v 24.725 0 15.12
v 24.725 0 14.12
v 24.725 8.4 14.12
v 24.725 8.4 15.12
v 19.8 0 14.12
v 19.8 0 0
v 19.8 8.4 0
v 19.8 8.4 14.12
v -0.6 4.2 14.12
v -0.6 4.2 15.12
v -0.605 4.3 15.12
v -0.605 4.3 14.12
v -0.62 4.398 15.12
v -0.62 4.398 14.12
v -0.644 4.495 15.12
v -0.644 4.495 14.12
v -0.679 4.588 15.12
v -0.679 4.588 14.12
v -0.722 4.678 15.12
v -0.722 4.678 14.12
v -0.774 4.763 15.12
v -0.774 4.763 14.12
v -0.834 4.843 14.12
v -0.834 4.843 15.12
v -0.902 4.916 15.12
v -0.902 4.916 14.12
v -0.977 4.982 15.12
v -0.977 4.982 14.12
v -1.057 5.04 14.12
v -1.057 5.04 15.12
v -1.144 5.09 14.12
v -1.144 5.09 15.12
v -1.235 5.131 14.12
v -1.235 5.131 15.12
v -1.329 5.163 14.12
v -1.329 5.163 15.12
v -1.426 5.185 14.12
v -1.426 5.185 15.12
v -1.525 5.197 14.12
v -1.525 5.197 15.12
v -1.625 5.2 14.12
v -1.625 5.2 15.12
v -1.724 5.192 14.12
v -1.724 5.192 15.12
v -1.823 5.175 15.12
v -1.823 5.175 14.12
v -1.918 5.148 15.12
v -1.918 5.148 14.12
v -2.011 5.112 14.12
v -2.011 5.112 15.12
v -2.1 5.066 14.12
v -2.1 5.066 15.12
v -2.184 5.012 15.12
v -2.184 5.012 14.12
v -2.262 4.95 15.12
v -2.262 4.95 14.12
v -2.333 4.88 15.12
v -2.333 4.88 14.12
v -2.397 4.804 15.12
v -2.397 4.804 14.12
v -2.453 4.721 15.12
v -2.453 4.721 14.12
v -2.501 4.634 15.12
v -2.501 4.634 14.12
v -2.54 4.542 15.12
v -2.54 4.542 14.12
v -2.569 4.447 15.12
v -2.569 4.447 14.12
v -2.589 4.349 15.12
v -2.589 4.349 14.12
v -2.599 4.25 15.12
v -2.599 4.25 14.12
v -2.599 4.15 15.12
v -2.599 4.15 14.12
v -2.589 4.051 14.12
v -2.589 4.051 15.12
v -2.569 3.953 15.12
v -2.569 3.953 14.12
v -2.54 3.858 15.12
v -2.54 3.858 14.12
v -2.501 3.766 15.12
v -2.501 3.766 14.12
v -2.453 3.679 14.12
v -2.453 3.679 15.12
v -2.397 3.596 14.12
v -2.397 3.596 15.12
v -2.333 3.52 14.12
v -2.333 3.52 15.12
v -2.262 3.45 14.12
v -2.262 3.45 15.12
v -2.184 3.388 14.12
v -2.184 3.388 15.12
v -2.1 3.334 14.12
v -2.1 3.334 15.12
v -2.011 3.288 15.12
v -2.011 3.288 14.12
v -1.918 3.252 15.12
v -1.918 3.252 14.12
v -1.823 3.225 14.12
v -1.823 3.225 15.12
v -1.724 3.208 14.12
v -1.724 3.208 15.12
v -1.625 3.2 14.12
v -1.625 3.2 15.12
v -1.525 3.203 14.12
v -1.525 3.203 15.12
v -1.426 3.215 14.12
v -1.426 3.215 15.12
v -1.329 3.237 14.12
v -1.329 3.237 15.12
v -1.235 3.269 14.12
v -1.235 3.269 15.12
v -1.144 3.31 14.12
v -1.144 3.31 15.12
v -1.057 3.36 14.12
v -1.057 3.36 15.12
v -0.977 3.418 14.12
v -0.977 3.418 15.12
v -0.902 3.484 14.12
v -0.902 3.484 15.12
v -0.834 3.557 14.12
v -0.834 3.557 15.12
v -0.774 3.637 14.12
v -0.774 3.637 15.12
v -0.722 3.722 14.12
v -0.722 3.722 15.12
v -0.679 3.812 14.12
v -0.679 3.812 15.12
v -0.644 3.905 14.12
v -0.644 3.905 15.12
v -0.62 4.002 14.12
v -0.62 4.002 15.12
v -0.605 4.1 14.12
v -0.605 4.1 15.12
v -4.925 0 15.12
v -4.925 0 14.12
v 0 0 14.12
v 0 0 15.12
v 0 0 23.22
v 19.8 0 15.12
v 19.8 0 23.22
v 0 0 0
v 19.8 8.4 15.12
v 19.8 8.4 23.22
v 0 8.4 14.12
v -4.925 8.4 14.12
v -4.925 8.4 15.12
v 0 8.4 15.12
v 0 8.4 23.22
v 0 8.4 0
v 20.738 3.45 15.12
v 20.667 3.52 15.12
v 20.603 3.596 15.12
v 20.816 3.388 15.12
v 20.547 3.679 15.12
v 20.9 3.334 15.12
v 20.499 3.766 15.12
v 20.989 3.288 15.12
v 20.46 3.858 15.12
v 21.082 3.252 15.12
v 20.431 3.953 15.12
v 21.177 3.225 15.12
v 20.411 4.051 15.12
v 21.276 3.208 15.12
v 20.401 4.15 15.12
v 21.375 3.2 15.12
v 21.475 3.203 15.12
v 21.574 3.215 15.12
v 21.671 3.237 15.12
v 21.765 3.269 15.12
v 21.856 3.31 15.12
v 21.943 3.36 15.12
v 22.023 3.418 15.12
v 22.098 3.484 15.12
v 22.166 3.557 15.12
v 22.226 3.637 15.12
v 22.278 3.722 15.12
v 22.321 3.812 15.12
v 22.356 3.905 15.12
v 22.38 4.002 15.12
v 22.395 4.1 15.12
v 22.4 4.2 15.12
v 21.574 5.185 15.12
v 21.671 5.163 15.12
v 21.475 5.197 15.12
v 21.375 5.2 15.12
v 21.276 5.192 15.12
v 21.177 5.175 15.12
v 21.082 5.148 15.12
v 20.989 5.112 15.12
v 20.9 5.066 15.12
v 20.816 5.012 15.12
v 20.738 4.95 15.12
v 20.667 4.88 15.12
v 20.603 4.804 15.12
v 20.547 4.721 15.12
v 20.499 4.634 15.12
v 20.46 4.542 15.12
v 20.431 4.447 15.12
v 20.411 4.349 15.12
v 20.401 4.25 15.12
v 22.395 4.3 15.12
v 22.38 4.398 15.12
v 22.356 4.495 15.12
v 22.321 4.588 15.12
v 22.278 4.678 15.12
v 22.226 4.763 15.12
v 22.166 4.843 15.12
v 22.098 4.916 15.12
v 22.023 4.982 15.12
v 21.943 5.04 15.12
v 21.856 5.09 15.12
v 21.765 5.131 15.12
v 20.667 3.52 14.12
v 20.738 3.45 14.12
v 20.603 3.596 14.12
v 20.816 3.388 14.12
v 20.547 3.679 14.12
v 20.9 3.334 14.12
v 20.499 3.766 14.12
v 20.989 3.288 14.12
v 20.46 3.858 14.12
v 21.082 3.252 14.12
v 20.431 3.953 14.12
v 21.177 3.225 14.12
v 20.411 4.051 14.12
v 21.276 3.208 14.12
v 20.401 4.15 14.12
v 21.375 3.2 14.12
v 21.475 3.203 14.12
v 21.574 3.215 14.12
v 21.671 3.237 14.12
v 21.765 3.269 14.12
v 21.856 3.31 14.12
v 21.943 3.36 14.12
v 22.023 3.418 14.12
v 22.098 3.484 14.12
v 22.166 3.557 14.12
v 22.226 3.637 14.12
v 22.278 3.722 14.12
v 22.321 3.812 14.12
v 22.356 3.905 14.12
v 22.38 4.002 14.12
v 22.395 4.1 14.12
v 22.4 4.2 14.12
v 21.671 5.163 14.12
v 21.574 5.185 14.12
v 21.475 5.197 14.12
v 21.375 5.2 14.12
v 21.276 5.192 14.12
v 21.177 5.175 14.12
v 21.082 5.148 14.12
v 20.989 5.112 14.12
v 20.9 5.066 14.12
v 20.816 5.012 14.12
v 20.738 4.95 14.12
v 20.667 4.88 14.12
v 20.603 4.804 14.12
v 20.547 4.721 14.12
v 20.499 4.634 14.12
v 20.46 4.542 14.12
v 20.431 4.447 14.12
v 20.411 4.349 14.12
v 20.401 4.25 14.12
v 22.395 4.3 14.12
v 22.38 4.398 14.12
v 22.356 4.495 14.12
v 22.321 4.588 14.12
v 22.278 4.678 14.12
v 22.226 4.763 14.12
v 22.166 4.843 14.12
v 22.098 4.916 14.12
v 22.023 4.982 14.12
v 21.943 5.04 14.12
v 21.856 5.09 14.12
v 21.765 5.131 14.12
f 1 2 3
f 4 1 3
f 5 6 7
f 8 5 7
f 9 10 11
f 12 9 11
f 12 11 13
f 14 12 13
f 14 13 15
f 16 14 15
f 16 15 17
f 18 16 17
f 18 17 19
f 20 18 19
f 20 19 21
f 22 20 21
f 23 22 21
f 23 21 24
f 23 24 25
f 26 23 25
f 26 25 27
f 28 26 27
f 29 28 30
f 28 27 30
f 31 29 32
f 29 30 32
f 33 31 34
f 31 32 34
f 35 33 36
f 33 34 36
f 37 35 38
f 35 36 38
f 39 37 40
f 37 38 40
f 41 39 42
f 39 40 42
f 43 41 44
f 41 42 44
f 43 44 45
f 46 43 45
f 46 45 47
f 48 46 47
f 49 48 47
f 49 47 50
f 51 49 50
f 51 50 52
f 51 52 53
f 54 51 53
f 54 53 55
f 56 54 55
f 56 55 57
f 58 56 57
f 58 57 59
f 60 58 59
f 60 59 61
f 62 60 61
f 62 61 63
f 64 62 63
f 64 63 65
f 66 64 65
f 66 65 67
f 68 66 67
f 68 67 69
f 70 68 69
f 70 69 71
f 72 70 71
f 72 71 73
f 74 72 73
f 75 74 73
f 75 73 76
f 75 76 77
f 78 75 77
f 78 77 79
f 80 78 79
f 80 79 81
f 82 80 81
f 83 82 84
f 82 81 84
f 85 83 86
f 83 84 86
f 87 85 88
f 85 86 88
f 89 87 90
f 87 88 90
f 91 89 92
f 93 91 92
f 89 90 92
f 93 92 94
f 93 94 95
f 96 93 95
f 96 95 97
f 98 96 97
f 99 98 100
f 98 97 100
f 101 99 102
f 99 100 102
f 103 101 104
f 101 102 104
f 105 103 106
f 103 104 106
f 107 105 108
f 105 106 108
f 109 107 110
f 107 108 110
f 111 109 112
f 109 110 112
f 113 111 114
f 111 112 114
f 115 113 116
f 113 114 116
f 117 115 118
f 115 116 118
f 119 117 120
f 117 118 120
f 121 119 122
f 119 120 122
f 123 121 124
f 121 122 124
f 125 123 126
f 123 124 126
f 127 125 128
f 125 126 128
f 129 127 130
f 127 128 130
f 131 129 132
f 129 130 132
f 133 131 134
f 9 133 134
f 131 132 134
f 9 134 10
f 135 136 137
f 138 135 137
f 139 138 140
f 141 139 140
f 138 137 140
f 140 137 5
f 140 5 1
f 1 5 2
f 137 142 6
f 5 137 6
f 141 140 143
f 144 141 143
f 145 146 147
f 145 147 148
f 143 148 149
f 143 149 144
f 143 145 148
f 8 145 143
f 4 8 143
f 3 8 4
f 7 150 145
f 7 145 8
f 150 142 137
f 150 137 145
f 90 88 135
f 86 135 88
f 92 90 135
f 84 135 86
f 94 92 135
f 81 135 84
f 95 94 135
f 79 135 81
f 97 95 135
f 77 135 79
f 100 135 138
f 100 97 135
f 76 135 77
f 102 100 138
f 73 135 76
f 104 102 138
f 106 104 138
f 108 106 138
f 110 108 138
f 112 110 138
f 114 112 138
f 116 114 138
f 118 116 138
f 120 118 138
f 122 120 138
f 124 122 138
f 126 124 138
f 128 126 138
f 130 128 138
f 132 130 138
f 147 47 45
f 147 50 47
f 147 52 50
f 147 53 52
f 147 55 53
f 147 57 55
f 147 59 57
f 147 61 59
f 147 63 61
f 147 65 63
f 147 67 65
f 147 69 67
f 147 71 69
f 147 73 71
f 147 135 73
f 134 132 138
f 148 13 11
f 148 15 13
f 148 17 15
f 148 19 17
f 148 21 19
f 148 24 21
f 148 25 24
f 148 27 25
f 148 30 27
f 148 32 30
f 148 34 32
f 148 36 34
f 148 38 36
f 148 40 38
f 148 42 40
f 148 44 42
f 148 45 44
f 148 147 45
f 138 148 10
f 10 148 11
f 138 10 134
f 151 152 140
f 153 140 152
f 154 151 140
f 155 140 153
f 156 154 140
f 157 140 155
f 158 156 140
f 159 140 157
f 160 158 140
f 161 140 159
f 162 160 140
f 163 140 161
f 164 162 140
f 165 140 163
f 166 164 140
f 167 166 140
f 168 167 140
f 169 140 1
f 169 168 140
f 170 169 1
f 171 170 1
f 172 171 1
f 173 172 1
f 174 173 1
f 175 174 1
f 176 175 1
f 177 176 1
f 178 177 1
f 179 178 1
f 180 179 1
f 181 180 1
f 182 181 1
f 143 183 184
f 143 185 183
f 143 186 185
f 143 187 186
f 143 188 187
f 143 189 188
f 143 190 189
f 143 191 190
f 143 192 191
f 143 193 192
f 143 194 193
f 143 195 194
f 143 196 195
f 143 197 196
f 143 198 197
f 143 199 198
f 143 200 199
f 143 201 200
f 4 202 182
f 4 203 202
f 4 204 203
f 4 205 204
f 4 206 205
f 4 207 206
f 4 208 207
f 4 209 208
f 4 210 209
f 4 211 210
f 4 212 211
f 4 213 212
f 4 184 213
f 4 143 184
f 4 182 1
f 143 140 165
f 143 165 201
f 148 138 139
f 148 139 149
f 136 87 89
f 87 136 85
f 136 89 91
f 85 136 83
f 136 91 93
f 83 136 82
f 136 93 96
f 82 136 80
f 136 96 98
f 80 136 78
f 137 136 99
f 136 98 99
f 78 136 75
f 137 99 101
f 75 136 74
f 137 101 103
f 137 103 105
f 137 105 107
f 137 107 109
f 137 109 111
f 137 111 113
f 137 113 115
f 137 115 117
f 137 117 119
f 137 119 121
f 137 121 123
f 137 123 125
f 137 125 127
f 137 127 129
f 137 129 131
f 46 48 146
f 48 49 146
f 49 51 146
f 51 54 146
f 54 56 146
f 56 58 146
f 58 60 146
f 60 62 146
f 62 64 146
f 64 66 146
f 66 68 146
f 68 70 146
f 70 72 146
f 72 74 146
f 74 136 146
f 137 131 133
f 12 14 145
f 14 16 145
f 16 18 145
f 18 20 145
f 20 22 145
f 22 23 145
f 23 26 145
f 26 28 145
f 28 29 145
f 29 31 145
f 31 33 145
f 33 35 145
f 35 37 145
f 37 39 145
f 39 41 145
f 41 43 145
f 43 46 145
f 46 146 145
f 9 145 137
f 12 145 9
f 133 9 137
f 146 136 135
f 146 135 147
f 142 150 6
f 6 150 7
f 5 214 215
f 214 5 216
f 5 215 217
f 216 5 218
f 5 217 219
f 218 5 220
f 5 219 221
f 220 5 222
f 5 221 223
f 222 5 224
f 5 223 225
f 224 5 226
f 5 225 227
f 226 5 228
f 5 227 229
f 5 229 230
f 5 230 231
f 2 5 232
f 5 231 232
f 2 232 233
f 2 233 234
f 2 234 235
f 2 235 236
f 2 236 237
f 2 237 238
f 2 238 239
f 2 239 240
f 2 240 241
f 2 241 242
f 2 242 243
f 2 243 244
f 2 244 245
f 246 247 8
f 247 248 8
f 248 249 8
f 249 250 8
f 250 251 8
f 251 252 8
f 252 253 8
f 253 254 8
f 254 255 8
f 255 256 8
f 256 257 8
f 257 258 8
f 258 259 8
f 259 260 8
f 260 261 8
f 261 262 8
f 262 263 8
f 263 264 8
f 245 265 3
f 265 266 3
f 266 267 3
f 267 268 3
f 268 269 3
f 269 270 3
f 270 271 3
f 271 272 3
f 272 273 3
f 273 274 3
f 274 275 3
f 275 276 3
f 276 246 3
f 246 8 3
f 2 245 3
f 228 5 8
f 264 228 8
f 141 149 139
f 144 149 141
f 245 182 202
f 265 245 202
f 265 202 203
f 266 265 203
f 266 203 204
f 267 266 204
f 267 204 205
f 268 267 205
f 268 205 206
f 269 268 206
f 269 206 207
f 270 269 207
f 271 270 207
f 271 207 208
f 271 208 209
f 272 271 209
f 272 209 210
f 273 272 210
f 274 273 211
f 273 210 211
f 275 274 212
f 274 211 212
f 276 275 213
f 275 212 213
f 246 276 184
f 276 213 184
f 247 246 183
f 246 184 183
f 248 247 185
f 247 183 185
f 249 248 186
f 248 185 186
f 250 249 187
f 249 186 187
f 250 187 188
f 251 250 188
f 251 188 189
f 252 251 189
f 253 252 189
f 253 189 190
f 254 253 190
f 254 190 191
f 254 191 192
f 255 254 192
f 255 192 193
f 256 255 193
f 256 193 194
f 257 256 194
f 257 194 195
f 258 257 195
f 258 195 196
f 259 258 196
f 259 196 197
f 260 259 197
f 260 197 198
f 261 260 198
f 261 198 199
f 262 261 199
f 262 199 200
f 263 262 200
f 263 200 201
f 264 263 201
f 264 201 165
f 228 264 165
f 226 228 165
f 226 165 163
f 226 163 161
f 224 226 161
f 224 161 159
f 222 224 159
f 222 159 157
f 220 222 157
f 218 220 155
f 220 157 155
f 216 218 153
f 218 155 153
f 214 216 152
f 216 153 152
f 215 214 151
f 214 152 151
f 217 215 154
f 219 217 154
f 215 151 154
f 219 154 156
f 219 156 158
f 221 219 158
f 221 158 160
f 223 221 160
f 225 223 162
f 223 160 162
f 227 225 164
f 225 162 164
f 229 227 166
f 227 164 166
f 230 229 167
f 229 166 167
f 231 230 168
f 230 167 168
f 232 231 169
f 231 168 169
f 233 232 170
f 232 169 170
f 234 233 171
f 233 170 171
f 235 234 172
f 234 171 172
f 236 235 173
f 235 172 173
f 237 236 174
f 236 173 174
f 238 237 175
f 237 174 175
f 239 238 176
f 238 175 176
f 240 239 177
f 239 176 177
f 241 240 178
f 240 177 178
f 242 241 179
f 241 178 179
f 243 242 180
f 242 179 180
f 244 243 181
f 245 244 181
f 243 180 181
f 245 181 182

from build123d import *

# Parameters (mm, degrees)
SKETCH_W     = 19.8
SKETCH_H     = 8.4
PAD_DEPTH    = 14.12
SKETCH001_W  = 29.65
SKETCH001_H  = 8.4
PAD001_DEPTH = 1
SKETCH002_R  = 1
POCKET_DEPTH = 15.121
SKETCH003_W  = 19.8
SKETCH003_H  = 8.4
PAD002_DEPTH = 8.1


with BuildPart() as part:
    # Sketch → Pad (new body)
    with BuildSketch(Plane.XY):
        with Locations((9.9, 4.2)):
            Rectangle(SKETCH_W, SKETCH_H)
    extrude(amount=PAD_DEPTH)

    # Sketch001 → Pad001 (new body)
    with BuildSketch(Plane.XY.offset(14.12)):
        with Locations((9.9, 4.2)):
            Rectangle(SKETCH001_W, SKETCH001_H)
    extrude(amount=PAD001_DEPTH)

    # Sketch002 → Pocket (cut, through all)
    with BuildSketch(Plane.XY.offset(15.12)):
        with Locations((-1.6, 4.2)):
            Circle(SKETCH002_R)
        with Locations((21.4, 4.2)):
            Circle(SKETCH002_R)
    extrude(amount=-POCKET_DEPTH, mode=Mode.SUBTRACT)

    # Sketch003 → Pad002 (new body)
    with BuildSketch(Plane.XY.offset(15.12)):
        with Locations((9.9, 4.2)):
            Rectangle(SKETCH003_W, SKETCH003_H)
    extrude(amount=PAD002_DEPTH)


solid = part.part
